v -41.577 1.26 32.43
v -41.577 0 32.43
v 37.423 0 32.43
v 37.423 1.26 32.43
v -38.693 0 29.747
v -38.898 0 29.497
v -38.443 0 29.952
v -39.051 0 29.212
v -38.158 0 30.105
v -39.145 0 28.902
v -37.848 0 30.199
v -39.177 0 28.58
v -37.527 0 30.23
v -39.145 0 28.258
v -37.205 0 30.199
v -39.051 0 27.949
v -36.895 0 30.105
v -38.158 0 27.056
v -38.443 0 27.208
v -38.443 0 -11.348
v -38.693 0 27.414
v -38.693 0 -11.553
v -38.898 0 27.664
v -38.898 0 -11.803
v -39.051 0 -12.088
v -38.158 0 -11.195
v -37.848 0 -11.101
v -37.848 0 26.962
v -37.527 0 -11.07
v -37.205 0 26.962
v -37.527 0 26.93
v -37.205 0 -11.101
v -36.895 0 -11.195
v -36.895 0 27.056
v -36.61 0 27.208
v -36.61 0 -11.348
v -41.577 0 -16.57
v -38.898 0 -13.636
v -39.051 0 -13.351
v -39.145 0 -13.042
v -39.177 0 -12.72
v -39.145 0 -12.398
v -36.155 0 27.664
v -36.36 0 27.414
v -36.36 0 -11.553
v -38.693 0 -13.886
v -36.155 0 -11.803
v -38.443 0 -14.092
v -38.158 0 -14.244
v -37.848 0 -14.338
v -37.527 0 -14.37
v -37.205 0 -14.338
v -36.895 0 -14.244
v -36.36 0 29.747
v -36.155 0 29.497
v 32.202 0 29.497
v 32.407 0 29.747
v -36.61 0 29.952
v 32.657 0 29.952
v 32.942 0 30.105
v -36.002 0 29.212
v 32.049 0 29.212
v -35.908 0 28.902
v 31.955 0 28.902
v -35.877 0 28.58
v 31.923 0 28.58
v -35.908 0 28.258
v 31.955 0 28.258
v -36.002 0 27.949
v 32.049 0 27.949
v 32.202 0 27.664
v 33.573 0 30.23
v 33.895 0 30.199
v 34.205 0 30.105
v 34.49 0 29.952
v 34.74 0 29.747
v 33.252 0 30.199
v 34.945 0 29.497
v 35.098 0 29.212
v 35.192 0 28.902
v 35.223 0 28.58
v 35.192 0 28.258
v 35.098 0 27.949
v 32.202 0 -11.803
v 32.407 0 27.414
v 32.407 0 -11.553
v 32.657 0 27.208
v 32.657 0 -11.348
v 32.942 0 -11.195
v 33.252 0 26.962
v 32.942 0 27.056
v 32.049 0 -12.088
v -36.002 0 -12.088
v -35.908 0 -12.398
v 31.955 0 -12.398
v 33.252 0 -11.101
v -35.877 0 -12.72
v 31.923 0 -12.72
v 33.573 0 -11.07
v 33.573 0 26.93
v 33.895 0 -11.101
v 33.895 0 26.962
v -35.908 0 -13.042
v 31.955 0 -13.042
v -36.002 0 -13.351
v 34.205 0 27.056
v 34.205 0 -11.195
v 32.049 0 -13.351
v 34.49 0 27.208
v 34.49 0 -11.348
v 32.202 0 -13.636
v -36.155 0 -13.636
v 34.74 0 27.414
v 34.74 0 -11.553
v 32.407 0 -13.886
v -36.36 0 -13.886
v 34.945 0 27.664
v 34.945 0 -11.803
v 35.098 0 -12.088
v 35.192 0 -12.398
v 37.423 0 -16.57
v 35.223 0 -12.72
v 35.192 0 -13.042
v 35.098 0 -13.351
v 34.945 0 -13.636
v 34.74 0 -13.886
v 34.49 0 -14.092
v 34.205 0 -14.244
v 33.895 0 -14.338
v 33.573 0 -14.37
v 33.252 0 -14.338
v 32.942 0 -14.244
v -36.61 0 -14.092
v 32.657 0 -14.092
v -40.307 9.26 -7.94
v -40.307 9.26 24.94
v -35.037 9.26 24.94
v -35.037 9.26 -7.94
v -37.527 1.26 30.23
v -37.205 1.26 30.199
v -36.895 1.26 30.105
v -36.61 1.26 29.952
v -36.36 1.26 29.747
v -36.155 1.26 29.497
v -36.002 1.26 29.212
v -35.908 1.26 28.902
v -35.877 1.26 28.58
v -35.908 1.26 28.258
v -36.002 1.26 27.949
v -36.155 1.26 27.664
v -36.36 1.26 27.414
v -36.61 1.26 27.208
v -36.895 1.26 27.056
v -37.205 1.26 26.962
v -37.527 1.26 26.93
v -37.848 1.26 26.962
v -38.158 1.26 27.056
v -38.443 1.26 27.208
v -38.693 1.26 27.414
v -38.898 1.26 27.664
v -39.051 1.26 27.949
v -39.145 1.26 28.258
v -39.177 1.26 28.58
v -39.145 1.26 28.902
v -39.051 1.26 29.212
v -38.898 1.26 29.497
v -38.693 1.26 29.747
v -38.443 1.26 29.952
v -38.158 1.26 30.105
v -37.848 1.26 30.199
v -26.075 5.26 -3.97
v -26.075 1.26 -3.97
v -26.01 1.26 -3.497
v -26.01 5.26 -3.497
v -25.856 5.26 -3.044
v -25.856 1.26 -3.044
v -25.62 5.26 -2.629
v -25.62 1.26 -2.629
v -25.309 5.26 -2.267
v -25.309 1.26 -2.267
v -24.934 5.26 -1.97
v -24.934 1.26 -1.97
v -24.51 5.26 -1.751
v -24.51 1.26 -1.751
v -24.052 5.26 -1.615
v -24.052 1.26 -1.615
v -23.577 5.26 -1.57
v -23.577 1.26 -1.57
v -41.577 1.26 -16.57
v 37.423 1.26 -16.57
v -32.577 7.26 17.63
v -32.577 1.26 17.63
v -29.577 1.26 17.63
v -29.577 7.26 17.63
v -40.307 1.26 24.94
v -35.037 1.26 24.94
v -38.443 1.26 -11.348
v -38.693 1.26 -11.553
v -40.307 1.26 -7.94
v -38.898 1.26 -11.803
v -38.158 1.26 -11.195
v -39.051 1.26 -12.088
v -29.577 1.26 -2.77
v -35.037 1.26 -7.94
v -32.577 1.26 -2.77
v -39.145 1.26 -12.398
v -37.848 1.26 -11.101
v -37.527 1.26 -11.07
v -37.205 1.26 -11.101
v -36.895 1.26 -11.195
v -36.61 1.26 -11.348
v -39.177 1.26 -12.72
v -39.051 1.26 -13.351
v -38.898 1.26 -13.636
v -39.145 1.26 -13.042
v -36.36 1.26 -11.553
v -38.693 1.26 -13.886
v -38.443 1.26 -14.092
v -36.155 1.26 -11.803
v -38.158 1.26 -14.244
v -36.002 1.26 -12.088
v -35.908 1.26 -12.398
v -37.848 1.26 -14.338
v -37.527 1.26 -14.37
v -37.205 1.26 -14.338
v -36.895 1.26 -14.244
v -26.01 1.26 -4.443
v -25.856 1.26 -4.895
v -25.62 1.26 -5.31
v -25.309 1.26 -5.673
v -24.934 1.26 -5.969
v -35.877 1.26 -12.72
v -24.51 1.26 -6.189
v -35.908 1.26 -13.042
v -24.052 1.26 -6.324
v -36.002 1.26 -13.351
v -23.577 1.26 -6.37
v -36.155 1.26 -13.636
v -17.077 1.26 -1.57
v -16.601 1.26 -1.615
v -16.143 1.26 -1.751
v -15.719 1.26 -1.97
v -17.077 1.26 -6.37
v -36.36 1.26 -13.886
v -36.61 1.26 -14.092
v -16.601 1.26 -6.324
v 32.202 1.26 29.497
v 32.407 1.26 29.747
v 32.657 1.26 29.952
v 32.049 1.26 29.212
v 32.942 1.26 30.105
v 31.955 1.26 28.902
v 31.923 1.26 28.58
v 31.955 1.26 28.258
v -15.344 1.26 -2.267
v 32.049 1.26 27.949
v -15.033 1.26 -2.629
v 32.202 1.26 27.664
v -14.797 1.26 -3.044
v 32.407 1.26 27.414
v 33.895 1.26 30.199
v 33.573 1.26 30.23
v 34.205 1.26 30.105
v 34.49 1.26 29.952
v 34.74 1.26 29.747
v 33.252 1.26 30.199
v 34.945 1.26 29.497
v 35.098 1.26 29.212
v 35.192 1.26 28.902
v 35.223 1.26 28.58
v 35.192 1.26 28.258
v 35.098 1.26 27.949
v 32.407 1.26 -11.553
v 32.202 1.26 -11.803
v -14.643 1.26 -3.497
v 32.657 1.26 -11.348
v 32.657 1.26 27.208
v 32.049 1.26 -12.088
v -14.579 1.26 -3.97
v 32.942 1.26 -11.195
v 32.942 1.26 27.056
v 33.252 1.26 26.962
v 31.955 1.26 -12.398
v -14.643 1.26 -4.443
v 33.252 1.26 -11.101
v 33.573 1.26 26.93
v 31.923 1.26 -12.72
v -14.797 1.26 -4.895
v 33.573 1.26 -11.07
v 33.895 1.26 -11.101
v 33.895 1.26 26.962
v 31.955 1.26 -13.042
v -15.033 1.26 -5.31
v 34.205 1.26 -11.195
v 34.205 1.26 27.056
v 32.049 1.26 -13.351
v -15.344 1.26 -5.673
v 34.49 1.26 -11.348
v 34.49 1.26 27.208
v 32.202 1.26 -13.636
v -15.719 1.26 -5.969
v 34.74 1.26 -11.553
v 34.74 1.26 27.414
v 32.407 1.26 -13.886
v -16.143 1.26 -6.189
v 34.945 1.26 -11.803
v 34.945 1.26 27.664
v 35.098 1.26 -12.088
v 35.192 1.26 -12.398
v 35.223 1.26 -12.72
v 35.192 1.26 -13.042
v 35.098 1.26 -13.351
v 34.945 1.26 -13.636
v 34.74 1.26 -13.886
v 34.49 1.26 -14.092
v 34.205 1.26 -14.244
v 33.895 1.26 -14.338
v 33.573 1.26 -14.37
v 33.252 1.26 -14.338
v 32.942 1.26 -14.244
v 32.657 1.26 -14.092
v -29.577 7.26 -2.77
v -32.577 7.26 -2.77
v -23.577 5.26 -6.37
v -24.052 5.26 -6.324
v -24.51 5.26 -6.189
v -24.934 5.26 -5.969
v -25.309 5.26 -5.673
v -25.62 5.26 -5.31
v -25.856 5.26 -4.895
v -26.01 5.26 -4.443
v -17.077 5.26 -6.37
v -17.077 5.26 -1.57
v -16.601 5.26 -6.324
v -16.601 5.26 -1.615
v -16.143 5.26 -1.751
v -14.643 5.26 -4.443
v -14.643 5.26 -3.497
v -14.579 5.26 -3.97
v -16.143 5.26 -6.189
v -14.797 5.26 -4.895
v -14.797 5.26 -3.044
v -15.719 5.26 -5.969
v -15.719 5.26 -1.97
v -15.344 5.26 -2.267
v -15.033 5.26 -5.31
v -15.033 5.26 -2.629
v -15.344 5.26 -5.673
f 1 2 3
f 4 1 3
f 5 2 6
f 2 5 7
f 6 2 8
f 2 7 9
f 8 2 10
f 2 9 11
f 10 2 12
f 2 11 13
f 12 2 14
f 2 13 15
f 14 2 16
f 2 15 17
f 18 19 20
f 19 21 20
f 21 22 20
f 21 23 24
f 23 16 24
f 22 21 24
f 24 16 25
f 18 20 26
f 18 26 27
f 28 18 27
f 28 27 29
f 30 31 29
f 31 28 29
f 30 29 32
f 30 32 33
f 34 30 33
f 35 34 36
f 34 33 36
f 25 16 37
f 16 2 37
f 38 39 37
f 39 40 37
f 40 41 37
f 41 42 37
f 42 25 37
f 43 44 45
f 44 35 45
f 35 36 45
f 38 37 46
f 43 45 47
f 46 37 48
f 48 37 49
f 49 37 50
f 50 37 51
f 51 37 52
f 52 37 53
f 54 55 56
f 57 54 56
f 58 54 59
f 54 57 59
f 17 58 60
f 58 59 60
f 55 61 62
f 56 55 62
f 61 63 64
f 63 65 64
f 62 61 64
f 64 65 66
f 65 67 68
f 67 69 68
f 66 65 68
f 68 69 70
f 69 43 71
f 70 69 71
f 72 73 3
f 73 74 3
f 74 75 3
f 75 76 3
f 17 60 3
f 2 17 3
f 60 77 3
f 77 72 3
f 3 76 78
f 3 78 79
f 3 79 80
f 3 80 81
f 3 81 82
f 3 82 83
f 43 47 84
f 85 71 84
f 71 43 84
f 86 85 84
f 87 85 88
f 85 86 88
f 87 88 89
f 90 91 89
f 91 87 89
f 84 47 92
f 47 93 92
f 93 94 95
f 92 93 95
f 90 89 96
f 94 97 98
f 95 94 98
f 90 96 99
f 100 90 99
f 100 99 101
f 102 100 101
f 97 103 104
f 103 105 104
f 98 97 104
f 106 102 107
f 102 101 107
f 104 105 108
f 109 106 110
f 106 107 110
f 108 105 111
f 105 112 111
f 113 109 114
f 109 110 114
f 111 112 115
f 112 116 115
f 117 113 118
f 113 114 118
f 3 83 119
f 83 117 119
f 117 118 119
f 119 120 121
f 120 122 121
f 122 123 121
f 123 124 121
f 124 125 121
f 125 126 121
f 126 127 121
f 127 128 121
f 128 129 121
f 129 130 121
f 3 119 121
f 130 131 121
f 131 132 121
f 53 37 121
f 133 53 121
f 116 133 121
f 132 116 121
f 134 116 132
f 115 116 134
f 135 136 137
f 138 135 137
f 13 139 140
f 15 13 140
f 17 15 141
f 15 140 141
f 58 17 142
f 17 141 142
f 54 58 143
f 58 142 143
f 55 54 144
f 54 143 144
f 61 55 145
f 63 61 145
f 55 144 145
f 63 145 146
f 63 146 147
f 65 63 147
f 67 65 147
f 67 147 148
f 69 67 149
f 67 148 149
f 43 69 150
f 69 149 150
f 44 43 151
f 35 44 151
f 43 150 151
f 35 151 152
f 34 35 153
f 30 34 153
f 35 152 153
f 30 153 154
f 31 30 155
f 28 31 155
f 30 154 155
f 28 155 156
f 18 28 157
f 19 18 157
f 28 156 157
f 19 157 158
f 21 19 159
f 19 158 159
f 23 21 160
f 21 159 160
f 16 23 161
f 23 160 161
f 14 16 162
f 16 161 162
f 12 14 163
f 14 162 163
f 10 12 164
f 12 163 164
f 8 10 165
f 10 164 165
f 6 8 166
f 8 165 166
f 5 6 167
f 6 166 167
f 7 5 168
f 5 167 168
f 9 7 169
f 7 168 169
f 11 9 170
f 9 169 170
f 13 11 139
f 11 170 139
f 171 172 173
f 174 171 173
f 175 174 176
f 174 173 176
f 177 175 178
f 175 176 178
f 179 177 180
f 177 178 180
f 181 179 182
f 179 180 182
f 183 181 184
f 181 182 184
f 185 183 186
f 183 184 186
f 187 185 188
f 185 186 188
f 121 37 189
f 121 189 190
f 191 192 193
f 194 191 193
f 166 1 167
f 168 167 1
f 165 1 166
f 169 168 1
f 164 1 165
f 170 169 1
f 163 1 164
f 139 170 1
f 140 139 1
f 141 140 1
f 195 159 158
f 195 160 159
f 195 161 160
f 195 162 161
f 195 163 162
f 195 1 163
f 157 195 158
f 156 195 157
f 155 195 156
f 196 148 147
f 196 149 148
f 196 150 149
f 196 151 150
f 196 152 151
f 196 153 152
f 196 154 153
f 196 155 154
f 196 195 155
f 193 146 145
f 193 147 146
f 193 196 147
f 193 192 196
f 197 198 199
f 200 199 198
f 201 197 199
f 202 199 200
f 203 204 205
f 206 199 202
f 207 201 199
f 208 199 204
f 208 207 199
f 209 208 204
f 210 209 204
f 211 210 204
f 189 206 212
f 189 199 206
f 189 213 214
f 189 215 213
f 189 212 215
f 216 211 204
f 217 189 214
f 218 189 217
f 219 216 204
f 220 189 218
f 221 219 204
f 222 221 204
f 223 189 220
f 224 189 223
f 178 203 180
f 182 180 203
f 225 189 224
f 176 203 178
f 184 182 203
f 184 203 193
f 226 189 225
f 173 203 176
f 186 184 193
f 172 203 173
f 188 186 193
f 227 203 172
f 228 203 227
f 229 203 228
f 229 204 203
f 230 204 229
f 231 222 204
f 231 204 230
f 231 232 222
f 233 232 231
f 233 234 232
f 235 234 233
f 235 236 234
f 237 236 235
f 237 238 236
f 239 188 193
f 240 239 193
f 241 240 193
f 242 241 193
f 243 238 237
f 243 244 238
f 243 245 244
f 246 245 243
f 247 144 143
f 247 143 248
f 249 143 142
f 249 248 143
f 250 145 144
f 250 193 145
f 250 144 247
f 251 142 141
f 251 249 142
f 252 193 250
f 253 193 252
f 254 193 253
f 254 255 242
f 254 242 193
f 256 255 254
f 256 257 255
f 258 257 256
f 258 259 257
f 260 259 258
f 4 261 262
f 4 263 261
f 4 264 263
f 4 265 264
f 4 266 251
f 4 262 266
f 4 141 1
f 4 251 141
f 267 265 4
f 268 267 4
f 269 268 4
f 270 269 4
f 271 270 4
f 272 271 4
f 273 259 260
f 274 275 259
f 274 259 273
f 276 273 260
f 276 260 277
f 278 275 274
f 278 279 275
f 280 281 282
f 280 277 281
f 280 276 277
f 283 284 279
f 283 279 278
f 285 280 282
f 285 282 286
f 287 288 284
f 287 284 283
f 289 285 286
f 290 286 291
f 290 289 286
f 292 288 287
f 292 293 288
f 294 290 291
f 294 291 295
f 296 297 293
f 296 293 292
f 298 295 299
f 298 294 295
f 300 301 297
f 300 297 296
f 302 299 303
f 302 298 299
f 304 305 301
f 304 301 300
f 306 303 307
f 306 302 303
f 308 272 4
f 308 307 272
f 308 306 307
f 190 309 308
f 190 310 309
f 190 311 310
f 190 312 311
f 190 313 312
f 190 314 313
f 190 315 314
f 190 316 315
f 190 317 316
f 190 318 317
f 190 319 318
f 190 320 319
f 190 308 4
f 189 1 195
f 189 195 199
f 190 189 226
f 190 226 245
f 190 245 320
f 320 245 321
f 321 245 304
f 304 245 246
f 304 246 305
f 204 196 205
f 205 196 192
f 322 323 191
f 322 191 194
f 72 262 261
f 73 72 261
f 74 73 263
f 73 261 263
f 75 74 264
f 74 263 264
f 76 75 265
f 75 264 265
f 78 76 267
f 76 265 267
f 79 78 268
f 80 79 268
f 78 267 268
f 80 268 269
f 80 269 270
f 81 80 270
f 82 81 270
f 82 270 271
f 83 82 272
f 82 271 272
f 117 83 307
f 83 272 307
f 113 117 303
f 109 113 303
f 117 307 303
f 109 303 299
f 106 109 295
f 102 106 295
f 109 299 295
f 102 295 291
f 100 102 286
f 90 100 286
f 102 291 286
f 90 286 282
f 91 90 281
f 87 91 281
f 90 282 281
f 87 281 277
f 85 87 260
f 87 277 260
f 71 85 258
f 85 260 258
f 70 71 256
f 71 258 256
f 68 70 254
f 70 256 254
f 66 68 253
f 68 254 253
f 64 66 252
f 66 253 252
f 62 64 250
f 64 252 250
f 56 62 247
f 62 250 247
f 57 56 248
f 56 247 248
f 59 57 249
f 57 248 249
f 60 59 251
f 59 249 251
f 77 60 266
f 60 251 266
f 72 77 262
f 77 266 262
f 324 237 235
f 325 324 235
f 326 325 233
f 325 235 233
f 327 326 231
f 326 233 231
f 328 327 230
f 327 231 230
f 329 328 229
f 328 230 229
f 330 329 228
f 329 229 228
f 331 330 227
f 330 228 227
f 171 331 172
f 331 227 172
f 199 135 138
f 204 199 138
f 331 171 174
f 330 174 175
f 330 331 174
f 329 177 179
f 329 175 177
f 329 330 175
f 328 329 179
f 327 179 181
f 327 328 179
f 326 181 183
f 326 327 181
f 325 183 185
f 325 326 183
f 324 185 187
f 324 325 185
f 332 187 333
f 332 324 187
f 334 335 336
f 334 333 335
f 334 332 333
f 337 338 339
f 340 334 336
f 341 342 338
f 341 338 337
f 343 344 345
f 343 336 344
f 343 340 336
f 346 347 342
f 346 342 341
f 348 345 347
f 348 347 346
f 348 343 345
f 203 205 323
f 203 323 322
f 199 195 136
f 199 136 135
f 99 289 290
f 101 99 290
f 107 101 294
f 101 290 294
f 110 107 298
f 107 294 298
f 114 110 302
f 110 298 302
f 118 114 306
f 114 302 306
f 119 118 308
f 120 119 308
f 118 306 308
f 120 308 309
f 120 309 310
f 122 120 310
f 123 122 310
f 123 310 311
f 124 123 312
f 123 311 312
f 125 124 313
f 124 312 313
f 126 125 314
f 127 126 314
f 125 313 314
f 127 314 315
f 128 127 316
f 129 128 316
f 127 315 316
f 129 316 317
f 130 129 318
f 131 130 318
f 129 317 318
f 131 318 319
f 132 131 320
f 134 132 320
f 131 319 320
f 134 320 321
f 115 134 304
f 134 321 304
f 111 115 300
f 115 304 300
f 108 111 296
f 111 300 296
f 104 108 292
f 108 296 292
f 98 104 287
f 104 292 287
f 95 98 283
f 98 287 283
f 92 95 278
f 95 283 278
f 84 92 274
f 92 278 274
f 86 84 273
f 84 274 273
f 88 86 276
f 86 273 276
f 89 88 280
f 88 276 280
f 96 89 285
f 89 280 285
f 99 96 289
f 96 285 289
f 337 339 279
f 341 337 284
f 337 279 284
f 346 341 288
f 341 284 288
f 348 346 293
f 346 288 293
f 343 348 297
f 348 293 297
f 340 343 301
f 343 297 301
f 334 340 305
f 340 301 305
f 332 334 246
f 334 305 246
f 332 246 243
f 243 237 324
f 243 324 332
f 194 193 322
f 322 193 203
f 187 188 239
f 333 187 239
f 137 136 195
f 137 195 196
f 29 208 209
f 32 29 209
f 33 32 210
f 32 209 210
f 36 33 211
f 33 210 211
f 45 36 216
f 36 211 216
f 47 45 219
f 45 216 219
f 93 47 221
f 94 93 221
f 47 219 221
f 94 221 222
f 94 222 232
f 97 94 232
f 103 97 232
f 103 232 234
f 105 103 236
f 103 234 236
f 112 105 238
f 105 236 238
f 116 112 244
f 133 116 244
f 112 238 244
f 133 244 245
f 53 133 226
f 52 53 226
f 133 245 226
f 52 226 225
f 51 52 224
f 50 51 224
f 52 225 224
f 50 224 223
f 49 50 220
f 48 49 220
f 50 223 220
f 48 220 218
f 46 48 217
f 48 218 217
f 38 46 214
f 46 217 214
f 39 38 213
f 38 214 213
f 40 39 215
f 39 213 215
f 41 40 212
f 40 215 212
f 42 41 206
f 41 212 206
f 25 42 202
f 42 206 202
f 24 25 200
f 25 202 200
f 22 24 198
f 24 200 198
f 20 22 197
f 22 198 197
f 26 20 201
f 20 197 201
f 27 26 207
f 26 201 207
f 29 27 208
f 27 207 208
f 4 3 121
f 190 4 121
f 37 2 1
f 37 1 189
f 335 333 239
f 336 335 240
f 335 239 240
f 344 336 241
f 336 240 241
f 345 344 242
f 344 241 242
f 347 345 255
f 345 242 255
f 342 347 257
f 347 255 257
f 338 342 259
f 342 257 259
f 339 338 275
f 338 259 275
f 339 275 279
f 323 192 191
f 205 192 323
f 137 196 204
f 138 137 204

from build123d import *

# Parameters (mm, degrees)
SKETCH1_W           = 79
SKETCH1_H           = 49
BOSS_EXTRUDE1_DEPTH = 1.26
SKETCH2_R           = 1.65
CUT_EXTRUDE1_DEPTH  = 1.26
SKETCH3_W           = 5.27
SKETCH3_H           = 32.88
BOSS_EXTRUDE2_DEPTH = 8
SKETCH4_W           = 3
SKETCH4_H           = 20.4
BOSS_EXTRUDE3_DEPTH = 6
SKETCH5_W           = 11.5
SKETCH5_H           = 4.8
BOSS_EXTRUDE4_DEPTH = 4
FILLET1_R           = 2.5


with BuildPart() as part:
    # Sketch1 → Boss-Extrude1 (new body)
    with BuildSketch(Plane(origin=(0, 0, 0), x_dir=(1, 0, 0), z_dir=(0, 1, 0))):
        with Locations((-2.076516426, -7.930241605)):
            Rectangle(SKETCH1_W, SKETCH1_H)
    extrude(amount=BOSS_EXTRUDE1_DEPTH)

    # Sketch2 → Cut-Extrude1 (cut)
    with BuildSketch(Plane(origin=(0, 1.26, 0), x_dir=(1, 0, 0), z_dir=(0, 1, 0))):
        with Locations(Location((33.573483574, 12.719758395, 0), (0, 0, 270))):
            Circle(SKETCH2_R)
        with Locations(Location((33.573483574, -28.580241605, 0), (0, 0, 270))):
            Circle(SKETCH2_R)
        with Locations(Location((-37.526516426, -28.580241605, 0), (0, 0, 270))):
            Circle(SKETCH2_R)
        with Locations(Location((-37.526516426, 12.719758395, 0), (0, 0, 270))):
            Circle(SKETCH2_R)
    extrude(amount=-CUT_EXTRUDE1_DEPTH, mode=Mode.SUBTRACT)

    # Sketch3 → Boss-Extrude2 (add)
    with BuildSketch(Plane(origin=(0, 1.26, 0), x_dir=(1, 0, 0), z_dir=(0, 1, 0))):
        with Locations((-37.671516426, -8.500241605)):
            Rectangle(SKETCH3_W, SKETCH3_H)
    extrude(amount=BOSS_EXTRUDE2_DEPTH)

    # Sketch4 → Boss-Extrude3 (add)
    with BuildSketch(Plane(origin=(0, 1.26, 0), x_dir=(1, 0, 0), z_dir=(0, 1, 0))):
        with Locations((-31.076516426, -7.430241605)):
            Rectangle(SKETCH4_W, SKETCH4_H)
    extrude(amount=BOSS_EXTRUDE3_DEPTH)

    # Sketch5 → Boss-Extrude4 (add)
    with BuildSketch(Plane(origin=(0, 1.26, 0), x_dir=(1, 0, 0), z_dir=(0, 1, 0))):
        with Locations((-20.326516426, 3.969758395)):
            Rectangle(SKETCH5_W, SKETCH5_H)
    extrude(amount=BOSS_EXTRUDE4_DEPTH)

    # Fillet1
    # the kernel refuses this fillet: 2.5 mm, written as the material it takes off along each edge
    with BuildSketch(Plane(origin=(-26.076516426, 1.26, -6.369758395), x_dir=(0, 0, 1), z_dir=(0, 1, 0)), Plane(origin=(-26.076516426, 1.26, -1.569758395), x_dir=(1, 0, 0), z_dir=(0, 1, 0)), Plane(origin=(-14.576516426, 1.26, -1.569758395), x_dir=(0, 0, -1), z_dir=(0, 1, 0))) as fillet1_piece_1:
        with BuildLine():
            CenterArc((FILLET1_R, FILLET1_R), FILLET1_R, 180, 90)
            Line((0, FILLET1_R), (0, 0))
            Line((0, 0), (FILLET1_R, 0))
        make_face()
    extrude(amount=10.25, mode=Mode.SUBTRACT)
    with BuildSketch(Plane(origin=(-14.576516426, 1.26, -6.369758395), x_dir=(0, 0, 1), z_dir=(0, 1, 0))) as fillet1_piece_2:
        with BuildLine():
            CenterArc((FILLET1_R, -FILLET1_R), FILLET1_R, 90, 90)
            Line((0, -FILLET1_R), (0, 0))
            Line((0, 0), (FILLET1_R, 0))
        make_face()
    extrude(amount=10.25, mode=Mode.SUBTRACT)


solid = part.part
